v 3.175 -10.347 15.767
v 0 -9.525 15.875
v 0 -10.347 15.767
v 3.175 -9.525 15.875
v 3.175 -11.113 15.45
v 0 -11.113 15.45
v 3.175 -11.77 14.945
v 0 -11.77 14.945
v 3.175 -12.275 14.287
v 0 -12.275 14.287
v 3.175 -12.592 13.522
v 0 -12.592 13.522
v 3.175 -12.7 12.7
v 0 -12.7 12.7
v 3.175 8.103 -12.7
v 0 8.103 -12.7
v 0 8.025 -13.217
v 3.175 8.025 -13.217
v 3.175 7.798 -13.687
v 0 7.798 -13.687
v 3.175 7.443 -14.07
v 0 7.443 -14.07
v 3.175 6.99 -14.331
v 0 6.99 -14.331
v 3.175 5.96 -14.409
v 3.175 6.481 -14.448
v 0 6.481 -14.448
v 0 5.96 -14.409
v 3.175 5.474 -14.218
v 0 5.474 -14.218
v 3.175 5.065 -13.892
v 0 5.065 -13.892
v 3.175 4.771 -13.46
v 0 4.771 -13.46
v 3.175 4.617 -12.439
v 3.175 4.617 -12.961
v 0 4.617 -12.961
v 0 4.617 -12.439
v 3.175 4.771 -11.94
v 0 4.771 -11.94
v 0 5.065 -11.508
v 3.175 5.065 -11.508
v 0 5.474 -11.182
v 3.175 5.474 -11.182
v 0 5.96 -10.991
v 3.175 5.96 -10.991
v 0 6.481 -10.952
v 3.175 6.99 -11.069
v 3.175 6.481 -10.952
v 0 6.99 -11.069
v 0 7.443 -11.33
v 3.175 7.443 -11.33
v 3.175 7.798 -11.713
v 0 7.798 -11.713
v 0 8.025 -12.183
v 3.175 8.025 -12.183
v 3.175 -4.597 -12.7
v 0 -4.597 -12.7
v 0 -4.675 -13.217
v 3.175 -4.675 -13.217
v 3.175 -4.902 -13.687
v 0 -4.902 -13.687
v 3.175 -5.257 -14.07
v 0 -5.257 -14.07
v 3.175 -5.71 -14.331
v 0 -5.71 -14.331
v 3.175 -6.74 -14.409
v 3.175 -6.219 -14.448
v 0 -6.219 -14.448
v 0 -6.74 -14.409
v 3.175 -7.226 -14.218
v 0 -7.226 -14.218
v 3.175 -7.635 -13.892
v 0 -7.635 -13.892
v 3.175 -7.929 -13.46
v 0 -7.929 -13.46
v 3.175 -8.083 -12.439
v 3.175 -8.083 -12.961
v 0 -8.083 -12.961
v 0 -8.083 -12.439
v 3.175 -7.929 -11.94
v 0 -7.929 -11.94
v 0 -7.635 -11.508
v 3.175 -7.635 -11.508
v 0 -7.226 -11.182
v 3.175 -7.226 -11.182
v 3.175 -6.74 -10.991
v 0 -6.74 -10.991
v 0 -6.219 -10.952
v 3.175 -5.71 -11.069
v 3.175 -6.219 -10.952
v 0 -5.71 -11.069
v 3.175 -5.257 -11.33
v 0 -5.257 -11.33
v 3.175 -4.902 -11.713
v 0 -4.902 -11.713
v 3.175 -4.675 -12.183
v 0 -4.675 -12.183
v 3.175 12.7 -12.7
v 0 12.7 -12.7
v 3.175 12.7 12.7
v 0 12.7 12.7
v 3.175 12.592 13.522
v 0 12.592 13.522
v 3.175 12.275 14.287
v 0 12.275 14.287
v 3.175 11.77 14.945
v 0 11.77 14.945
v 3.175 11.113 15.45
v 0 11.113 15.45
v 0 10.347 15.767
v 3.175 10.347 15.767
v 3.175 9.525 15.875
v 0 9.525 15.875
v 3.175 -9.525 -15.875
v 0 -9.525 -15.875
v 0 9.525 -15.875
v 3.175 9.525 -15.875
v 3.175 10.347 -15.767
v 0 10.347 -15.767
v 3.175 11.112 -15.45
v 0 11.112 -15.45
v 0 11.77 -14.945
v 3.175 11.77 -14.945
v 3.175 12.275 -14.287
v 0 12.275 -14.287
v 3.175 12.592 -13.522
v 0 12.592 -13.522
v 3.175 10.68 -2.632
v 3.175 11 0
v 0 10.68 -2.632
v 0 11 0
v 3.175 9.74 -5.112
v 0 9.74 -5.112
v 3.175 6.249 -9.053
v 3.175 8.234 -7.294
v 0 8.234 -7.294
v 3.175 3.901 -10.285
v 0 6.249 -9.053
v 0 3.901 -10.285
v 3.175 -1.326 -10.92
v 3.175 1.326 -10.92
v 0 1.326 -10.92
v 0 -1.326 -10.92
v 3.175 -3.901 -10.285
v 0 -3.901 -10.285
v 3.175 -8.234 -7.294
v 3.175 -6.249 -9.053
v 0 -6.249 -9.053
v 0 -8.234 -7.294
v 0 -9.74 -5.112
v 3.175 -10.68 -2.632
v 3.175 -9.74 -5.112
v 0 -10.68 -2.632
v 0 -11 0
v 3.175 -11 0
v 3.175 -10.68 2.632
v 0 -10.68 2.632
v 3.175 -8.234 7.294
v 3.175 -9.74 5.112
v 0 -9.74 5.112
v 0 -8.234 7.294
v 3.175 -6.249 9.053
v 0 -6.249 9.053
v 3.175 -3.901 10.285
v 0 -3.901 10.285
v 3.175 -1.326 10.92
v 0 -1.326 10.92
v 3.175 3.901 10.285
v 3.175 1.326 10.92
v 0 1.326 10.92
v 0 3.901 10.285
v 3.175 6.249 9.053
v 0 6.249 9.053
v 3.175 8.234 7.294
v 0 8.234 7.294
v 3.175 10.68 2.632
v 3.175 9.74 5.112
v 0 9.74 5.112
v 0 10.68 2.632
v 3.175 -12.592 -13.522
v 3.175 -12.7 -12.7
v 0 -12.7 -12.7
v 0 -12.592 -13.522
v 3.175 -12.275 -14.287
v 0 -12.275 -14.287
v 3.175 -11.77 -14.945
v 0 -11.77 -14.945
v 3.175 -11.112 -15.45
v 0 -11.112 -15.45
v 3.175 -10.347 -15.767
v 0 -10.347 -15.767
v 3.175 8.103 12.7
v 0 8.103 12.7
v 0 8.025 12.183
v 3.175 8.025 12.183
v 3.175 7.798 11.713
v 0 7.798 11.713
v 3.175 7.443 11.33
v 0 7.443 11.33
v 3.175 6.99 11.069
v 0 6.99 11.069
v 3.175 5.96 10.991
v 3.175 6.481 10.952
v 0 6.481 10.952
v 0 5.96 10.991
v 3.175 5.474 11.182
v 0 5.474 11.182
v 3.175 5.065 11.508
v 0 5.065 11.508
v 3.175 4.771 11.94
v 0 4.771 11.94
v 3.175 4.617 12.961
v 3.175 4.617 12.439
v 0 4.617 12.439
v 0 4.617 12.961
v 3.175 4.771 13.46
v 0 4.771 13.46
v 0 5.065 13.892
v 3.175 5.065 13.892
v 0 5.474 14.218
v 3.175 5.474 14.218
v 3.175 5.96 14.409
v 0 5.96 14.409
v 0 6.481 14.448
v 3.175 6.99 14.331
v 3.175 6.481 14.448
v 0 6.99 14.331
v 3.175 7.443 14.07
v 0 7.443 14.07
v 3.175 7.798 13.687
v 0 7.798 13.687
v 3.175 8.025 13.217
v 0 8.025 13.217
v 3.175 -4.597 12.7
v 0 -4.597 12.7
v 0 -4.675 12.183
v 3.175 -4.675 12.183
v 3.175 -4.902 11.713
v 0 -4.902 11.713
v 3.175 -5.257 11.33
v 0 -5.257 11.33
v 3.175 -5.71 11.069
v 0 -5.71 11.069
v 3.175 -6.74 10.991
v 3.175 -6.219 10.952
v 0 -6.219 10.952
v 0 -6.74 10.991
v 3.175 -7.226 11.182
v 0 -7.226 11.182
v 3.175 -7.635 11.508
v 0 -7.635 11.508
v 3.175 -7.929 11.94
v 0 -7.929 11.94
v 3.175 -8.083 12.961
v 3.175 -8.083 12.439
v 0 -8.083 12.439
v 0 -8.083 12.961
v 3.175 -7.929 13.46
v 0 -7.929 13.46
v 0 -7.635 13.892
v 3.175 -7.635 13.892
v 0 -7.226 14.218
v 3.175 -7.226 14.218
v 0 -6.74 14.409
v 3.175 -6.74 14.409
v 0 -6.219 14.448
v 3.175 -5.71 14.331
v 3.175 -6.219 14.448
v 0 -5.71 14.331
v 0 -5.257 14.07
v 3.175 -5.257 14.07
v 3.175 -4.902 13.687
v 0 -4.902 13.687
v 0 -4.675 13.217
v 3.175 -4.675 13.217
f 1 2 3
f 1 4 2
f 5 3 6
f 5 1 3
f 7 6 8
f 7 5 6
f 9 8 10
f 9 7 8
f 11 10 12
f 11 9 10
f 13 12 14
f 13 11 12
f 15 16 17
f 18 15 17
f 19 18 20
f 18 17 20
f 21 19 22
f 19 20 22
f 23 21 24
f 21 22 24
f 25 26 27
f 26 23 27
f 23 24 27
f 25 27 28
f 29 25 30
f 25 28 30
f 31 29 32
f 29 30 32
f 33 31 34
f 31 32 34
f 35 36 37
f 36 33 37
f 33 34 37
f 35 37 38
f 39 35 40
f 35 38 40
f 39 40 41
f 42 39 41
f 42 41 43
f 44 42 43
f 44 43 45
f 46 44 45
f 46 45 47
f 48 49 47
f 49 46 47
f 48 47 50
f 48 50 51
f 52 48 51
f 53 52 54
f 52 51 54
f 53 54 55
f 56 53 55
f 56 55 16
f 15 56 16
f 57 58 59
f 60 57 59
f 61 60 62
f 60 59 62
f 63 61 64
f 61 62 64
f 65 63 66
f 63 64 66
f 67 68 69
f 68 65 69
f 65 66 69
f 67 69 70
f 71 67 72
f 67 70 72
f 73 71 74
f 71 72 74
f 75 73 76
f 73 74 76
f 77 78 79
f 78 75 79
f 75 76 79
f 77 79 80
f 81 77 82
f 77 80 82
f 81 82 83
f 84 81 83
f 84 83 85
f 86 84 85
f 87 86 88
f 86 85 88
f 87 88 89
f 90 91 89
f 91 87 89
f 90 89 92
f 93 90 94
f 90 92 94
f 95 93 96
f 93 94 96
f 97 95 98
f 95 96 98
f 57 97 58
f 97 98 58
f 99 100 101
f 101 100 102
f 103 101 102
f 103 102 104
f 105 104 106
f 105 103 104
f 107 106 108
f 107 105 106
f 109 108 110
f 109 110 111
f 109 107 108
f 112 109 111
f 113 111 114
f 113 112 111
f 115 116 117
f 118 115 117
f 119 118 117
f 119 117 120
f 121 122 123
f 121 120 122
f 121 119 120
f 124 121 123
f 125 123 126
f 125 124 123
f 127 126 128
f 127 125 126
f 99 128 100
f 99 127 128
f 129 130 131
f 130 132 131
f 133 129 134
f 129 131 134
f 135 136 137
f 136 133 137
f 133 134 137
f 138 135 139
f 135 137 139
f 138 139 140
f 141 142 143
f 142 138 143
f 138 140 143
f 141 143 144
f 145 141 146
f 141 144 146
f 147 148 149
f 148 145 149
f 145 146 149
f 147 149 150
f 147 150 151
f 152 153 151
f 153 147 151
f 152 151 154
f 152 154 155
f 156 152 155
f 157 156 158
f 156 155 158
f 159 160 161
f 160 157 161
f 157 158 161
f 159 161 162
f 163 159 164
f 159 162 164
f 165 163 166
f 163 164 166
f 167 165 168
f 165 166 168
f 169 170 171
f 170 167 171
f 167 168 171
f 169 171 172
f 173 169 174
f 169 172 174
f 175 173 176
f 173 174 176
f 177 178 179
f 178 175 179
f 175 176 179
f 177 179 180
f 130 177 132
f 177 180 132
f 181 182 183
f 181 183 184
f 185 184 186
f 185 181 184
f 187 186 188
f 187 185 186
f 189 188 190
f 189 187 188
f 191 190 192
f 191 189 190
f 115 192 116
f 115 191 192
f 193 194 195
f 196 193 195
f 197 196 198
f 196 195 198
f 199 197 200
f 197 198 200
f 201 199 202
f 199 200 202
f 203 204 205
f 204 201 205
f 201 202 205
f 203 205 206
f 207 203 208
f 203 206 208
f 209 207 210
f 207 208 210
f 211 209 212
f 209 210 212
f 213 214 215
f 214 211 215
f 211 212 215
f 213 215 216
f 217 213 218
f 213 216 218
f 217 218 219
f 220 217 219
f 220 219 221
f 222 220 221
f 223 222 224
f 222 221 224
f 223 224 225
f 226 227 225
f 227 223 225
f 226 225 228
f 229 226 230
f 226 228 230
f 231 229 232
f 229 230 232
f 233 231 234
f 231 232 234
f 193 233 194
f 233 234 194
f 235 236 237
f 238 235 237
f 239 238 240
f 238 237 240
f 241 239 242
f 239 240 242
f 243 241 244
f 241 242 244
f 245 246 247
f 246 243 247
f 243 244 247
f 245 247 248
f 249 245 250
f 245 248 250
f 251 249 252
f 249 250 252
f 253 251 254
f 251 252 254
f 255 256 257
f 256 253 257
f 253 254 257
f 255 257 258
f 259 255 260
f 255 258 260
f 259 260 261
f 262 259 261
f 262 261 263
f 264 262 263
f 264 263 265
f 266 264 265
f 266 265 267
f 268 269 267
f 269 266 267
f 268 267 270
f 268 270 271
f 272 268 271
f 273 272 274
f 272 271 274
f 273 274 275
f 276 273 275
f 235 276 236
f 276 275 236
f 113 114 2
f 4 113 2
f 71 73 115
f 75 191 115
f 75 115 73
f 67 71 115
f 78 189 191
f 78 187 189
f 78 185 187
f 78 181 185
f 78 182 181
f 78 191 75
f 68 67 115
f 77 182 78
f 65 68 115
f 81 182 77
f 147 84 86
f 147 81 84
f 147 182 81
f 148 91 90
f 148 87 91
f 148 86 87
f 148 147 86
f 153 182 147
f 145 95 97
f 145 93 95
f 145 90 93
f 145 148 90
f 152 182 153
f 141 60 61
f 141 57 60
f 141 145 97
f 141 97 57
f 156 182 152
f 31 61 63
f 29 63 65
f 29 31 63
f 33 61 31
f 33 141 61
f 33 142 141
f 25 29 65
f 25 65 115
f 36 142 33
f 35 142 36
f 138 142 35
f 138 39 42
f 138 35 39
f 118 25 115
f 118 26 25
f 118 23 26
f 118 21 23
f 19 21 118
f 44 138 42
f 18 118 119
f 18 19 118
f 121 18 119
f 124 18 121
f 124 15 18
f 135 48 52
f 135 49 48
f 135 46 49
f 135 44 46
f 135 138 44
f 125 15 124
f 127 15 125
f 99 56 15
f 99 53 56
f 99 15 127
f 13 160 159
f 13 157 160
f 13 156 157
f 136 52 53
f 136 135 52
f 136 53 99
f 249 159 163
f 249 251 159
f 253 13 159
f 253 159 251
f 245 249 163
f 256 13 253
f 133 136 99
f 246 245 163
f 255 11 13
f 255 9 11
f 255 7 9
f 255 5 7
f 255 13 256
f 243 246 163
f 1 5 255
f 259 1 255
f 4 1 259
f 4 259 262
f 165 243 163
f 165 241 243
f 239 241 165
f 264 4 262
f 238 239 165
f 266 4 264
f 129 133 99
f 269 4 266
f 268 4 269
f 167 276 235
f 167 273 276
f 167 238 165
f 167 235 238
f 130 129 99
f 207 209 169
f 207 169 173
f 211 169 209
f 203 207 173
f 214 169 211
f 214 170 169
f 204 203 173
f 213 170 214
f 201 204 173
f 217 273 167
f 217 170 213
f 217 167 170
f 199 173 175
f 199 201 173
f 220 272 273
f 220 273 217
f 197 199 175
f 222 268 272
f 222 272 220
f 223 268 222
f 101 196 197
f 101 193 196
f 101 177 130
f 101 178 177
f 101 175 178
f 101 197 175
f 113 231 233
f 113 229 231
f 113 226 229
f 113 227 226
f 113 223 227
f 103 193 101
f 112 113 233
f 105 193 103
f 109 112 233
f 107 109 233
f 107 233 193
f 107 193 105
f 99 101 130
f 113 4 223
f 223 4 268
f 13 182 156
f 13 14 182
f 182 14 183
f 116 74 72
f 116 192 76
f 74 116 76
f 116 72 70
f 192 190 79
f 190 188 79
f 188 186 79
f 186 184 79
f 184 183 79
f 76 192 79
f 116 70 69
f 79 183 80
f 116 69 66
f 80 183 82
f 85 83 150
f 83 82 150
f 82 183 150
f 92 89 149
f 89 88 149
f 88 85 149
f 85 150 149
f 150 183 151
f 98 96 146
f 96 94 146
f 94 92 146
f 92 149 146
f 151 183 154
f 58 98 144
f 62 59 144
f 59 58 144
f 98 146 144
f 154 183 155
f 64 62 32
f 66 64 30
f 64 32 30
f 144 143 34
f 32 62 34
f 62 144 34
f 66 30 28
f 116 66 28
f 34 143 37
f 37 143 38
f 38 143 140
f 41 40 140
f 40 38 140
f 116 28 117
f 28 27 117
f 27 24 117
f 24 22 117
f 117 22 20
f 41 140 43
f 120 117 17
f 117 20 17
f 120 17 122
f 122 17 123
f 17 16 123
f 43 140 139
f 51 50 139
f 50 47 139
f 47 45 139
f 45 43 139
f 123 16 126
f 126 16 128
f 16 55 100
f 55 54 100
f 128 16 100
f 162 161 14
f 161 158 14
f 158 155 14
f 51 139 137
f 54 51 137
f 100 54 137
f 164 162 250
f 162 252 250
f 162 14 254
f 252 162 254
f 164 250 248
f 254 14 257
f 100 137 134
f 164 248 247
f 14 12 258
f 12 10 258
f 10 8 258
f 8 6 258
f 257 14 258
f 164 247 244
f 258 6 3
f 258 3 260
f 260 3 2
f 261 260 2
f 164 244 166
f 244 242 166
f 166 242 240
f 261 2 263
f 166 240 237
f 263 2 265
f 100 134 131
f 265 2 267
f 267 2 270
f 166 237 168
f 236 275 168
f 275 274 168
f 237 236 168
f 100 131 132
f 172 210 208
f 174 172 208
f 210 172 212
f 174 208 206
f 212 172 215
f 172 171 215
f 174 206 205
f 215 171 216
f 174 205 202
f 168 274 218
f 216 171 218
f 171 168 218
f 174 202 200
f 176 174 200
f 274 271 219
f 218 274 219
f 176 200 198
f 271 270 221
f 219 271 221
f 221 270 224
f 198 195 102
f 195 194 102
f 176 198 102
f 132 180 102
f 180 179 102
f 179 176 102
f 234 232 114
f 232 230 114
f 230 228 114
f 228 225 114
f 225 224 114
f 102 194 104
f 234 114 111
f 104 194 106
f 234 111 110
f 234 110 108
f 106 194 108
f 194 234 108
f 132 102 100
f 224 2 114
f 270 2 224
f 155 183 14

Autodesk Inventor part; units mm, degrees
ref_plane "YZ Plane" through (0, 0, 0) normal (1, 0, 0) x (0, 1, 0)
ref_plane "XZ Plane" through (0, 0, 0) normal (0, 1, 0) x (-1, 0, 0)
ref_plane "XY Plane" through (0, 0, 0) normal (0, 0, 1) x (1, 0, 0)
sketch "Sketch1" plane through (0, 0, 0) normal (1, 0, 0) x (0, 1, 0)
  circle A0 centre (0, 0) radius 11
  line L0 (0, 0) -> (0, -12.7) construction
  line L1 (0, -12.7) -> (6.35, -12.7) construction
  circle A1 centre (6.35, -12.7) radius 1.7526
  circle A2 centre (-6.35, -12.7) radius 1.7526
  circle A3 centre (6.35, 12.7) radius 1.7526
  circle A4 centre (-6.35, 12.7) radius 1.7526
  line L2 (12.7, 15.875) -> (-12.7, 15.875)
  line L3 (-12.7, 15.875) -> (-12.7, -15.875)
  line L4 (-12.7, -15.875) -> (12.7, -15.875)
  line L5 (12.7, -15.875) -> (12.7, 15.875)
  line L6 (12.7, 15.875) -> (-12.7, -15.875) construction
  line L7 (-12.7, 15.875) -> (12.7, -15.875) construction
  line L8 (0, 0) -> (9, 0) construction
  dimension "d0" = 22
  dimension "d1" = 12.7
  dimension "d2" = 6.35
  dimension "d3" = 3.5052
  dimension "d6" = 12.7
  dimension "d9" = 25.4
  dimension "d12" = 25.4
  dimension "d13" = 31.75
  dimension "d15" = 9
extrude "Extrusion1" add sketch "Sketch1" along normal blind 3.175
fillet "Fillet1" radius 3.175 4 edges at (1.5875, 12.7, 15.875) (1.5875, -12.7, 15.875) (1.5875, 12.7, -15.875) (1.5875, -12.7, -15.875)
equation "\"d9\" = 2 * d1"
properties part number "Motor Plates" material "UHMW, Black"
